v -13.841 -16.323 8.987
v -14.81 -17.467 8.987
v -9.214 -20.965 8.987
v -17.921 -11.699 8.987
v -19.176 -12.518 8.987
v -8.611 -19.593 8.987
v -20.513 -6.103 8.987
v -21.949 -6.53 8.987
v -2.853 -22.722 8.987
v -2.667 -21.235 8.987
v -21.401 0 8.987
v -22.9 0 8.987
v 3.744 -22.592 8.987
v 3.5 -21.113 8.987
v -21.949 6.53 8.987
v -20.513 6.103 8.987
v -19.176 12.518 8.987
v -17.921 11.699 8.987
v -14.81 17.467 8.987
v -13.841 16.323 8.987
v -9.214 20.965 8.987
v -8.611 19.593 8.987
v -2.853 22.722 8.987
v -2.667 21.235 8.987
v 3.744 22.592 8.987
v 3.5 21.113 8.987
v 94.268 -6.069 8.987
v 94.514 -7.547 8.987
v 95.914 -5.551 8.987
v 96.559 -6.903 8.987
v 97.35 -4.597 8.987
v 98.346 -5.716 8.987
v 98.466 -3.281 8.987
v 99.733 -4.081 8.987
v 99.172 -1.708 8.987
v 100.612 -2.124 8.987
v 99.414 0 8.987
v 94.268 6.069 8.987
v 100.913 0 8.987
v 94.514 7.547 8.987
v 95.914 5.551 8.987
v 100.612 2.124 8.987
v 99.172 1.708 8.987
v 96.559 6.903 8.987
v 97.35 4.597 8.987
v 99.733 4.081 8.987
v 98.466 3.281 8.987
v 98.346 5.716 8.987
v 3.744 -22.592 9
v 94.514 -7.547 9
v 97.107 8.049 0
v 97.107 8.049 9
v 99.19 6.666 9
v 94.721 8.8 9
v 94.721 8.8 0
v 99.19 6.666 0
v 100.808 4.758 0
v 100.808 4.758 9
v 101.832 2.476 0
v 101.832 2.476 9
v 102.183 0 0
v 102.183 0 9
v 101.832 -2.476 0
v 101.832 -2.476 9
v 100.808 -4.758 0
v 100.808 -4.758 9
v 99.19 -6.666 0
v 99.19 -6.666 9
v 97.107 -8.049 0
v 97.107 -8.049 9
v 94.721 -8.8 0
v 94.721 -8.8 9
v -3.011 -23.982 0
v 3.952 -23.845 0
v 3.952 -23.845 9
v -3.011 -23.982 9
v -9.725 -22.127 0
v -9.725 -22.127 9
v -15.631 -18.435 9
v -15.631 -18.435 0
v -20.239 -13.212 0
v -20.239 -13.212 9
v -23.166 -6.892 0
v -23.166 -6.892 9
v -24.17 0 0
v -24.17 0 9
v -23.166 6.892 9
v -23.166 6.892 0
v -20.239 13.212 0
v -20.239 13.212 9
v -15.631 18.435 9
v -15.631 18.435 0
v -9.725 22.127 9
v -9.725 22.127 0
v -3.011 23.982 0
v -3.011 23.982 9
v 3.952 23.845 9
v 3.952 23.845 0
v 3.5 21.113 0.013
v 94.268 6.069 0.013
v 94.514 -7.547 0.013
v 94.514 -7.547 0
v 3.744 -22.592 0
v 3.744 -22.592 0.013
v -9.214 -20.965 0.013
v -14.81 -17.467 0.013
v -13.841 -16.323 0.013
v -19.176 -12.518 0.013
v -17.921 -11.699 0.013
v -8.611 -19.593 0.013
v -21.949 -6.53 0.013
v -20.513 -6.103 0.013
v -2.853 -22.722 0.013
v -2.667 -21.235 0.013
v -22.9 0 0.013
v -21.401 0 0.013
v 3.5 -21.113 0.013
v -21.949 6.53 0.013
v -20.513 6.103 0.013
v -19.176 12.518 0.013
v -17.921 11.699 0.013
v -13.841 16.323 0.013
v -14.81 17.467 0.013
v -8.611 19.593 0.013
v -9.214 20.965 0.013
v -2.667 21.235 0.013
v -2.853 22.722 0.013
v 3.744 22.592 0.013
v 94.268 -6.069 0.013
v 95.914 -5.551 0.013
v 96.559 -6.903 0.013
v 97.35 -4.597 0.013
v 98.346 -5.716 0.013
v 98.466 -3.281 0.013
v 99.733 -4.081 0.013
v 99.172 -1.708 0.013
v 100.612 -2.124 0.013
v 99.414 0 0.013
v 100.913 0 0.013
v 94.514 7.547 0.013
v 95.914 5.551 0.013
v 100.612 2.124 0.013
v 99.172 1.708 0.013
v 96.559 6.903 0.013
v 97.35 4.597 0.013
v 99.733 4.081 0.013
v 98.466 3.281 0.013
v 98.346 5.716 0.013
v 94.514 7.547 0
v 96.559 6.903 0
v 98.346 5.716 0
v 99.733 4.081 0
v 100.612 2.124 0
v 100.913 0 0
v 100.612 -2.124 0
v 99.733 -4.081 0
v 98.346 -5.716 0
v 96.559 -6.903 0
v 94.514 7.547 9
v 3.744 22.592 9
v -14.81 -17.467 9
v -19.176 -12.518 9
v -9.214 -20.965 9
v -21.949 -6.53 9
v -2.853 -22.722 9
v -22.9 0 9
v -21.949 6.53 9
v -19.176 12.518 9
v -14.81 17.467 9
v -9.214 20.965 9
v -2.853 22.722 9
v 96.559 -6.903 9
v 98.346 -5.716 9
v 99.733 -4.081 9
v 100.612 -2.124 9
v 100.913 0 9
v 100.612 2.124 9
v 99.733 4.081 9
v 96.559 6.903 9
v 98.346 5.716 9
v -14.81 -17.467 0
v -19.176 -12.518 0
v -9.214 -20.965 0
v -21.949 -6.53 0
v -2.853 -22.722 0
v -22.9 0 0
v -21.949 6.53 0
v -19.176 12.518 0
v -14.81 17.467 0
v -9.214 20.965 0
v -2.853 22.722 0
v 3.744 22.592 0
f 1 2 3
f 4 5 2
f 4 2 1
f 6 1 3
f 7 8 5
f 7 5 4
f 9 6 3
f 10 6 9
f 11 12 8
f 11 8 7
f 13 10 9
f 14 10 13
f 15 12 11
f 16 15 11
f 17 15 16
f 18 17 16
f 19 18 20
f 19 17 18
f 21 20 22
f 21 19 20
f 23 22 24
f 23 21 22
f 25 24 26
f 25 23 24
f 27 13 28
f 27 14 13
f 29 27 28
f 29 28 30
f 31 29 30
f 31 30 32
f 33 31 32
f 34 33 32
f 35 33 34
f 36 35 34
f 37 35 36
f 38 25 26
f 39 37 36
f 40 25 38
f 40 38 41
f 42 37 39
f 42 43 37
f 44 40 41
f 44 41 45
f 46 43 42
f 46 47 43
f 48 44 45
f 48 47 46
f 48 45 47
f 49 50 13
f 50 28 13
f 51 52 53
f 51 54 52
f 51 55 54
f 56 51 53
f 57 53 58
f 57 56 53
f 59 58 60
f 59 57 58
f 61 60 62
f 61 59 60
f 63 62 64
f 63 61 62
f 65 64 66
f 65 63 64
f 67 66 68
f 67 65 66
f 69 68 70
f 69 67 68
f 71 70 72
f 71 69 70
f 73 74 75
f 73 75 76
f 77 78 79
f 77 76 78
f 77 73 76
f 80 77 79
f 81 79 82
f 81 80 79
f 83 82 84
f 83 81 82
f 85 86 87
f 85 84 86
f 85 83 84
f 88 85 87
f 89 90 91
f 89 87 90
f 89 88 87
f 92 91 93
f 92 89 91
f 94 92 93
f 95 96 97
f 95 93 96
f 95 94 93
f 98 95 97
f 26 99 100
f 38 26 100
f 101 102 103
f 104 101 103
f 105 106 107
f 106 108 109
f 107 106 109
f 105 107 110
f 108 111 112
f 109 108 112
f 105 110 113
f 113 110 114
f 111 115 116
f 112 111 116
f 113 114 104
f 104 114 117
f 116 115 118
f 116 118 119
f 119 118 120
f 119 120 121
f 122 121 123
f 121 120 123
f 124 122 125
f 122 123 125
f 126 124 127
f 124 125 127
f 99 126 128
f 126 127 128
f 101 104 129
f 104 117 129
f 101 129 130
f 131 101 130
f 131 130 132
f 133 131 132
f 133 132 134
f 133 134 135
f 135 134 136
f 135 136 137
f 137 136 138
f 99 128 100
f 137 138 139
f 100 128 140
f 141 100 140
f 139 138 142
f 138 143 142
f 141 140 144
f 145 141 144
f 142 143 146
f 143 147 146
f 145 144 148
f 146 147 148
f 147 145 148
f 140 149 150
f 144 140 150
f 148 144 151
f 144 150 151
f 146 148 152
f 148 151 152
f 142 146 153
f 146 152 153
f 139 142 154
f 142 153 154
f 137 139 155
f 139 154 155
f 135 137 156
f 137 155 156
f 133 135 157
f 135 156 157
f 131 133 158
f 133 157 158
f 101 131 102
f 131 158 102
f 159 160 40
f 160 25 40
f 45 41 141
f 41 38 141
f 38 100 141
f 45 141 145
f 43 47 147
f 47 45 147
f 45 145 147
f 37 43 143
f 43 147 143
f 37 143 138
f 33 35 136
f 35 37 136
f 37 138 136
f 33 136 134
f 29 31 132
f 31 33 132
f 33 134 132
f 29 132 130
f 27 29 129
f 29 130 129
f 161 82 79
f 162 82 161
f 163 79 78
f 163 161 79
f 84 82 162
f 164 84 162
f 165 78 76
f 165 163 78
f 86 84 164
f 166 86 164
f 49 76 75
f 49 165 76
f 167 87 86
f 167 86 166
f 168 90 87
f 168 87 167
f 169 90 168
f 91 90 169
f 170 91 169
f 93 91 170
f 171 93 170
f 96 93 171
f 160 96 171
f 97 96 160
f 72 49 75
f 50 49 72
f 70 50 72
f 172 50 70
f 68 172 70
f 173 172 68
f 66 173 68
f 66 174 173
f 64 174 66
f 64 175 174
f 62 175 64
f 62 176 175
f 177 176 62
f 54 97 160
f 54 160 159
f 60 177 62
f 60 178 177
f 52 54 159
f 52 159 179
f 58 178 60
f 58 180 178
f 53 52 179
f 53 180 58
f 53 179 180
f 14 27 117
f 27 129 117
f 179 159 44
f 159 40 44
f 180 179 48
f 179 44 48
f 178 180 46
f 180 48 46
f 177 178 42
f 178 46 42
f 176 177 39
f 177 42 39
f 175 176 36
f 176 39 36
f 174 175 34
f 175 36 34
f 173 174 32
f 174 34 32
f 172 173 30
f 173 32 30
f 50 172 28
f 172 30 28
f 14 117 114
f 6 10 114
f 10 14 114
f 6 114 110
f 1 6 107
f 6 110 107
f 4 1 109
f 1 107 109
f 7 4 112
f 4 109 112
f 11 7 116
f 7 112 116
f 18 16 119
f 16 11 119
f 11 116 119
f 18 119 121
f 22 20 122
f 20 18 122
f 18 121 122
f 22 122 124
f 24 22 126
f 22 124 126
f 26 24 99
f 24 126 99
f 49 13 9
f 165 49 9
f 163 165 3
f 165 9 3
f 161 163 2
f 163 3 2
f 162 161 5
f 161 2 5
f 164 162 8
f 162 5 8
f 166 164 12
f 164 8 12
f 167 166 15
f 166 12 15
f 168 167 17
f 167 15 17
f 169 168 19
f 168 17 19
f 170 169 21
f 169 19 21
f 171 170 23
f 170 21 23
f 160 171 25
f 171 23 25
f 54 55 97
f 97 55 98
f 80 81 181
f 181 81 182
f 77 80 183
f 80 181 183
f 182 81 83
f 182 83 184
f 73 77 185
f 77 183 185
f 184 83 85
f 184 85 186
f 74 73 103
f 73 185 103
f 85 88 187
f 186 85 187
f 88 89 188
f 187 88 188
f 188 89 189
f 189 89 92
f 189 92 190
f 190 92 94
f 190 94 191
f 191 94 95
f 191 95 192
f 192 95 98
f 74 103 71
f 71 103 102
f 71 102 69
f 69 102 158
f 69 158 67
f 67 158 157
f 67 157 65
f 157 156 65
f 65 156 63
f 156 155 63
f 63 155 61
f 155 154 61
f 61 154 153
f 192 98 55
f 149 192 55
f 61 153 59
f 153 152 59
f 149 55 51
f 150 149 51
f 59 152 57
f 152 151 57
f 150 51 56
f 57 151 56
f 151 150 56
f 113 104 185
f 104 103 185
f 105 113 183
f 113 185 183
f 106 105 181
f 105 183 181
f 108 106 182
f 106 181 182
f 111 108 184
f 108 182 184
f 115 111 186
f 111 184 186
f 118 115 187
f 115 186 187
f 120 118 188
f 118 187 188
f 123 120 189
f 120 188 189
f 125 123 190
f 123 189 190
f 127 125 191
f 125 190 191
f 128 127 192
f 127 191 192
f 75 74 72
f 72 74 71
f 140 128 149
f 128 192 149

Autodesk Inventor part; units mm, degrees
ref_plane "YZ Plane" through (0, 0, 0) normal (1, 0, 0) x (0, 1, 0)
ref_plane "XZ Plane" through (0, 0, 0) normal (0, 1, 0) x (-1, 0, 0)
ref_plane "XY Plane" through (0, 0, 0) normal (0, 0, 1) x (1, 0, 0)
sketch "Sketch1" plane through (0, 0, 0) normal (0, 0, 1) x (1, 0, 0)
  line L0 (3.7445, 22.5918) -> (94.5135, 7.547)
  line L1 (94.5135, -7.547) -> (3.7445, -22.5918)
  arc A0 (94.5135, -7.547) -> (94.5135, 7.547) centre (93.2626, 0) ccw
  arc A1 (3.7445, 22.5918) -> (3.7445, -22.5918) centre (0, 0) ccw
  line L2 (94.7211, 8.7999) -> (3.9522, 23.8447)
  arc A2 (3.9522, 23.8447) -> (3.9522, -23.8447) centre (0, 0) ccw
  line L3 (3.9522, -23.8447) -> (94.7211, -8.7999)
  arc A3 (94.7211, -8.7999) -> (94.7211, 8.7999) centre (93.2626, 0) ccw
  dimension "d7" = 1.27
extrude "Extrusion1" add sketch "Sketch1" along normal blind 9
ref_plane "Work Plane1" through (0, 0, 4.5) normal (0, 0, 1) x (1, 0, 0)
sketch "Sketch2" plane through (0, 0, 4.5) normal (0, 0, 1) x (1, 0, 0)
  arc A0 (3.7445, 22.5918) -> (3.7445, -22.5918) centre (0, 0) ccw projected
  line L0 (94.5135, 7.547) -> (3.7445, 22.5918) projected
  arc A1 (94.5135, -7.547) -> (94.5135, 7.547) centre (93.2626, 0) ccw projected
  line L1 (3.7445, -22.5918) -> (94.5135, -7.547) projected
  arc A2 (3.4995, 21.1133) -> (3.4995, -21.1133) centre (0, 0) ccw
  line L2 (3.4995, 21.1133) -> (94.2684, 6.0686)
  arc A3 (94.2684, -6.0686) -> (94.2684, 6.0686) centre (93.2626, 0) ccw
  line L3 (94.2684, -6.0686) -> (3.4995, -21.1133)
  dimension "d11" = 1.4986
extrude "Extrusion2" add sketch "Sketch2" along normal mid plane 8.9746
equation "\"d5\" = 45.8"
equation "\"d6\" = 15.3"
properties part number "285 mm Belt"
